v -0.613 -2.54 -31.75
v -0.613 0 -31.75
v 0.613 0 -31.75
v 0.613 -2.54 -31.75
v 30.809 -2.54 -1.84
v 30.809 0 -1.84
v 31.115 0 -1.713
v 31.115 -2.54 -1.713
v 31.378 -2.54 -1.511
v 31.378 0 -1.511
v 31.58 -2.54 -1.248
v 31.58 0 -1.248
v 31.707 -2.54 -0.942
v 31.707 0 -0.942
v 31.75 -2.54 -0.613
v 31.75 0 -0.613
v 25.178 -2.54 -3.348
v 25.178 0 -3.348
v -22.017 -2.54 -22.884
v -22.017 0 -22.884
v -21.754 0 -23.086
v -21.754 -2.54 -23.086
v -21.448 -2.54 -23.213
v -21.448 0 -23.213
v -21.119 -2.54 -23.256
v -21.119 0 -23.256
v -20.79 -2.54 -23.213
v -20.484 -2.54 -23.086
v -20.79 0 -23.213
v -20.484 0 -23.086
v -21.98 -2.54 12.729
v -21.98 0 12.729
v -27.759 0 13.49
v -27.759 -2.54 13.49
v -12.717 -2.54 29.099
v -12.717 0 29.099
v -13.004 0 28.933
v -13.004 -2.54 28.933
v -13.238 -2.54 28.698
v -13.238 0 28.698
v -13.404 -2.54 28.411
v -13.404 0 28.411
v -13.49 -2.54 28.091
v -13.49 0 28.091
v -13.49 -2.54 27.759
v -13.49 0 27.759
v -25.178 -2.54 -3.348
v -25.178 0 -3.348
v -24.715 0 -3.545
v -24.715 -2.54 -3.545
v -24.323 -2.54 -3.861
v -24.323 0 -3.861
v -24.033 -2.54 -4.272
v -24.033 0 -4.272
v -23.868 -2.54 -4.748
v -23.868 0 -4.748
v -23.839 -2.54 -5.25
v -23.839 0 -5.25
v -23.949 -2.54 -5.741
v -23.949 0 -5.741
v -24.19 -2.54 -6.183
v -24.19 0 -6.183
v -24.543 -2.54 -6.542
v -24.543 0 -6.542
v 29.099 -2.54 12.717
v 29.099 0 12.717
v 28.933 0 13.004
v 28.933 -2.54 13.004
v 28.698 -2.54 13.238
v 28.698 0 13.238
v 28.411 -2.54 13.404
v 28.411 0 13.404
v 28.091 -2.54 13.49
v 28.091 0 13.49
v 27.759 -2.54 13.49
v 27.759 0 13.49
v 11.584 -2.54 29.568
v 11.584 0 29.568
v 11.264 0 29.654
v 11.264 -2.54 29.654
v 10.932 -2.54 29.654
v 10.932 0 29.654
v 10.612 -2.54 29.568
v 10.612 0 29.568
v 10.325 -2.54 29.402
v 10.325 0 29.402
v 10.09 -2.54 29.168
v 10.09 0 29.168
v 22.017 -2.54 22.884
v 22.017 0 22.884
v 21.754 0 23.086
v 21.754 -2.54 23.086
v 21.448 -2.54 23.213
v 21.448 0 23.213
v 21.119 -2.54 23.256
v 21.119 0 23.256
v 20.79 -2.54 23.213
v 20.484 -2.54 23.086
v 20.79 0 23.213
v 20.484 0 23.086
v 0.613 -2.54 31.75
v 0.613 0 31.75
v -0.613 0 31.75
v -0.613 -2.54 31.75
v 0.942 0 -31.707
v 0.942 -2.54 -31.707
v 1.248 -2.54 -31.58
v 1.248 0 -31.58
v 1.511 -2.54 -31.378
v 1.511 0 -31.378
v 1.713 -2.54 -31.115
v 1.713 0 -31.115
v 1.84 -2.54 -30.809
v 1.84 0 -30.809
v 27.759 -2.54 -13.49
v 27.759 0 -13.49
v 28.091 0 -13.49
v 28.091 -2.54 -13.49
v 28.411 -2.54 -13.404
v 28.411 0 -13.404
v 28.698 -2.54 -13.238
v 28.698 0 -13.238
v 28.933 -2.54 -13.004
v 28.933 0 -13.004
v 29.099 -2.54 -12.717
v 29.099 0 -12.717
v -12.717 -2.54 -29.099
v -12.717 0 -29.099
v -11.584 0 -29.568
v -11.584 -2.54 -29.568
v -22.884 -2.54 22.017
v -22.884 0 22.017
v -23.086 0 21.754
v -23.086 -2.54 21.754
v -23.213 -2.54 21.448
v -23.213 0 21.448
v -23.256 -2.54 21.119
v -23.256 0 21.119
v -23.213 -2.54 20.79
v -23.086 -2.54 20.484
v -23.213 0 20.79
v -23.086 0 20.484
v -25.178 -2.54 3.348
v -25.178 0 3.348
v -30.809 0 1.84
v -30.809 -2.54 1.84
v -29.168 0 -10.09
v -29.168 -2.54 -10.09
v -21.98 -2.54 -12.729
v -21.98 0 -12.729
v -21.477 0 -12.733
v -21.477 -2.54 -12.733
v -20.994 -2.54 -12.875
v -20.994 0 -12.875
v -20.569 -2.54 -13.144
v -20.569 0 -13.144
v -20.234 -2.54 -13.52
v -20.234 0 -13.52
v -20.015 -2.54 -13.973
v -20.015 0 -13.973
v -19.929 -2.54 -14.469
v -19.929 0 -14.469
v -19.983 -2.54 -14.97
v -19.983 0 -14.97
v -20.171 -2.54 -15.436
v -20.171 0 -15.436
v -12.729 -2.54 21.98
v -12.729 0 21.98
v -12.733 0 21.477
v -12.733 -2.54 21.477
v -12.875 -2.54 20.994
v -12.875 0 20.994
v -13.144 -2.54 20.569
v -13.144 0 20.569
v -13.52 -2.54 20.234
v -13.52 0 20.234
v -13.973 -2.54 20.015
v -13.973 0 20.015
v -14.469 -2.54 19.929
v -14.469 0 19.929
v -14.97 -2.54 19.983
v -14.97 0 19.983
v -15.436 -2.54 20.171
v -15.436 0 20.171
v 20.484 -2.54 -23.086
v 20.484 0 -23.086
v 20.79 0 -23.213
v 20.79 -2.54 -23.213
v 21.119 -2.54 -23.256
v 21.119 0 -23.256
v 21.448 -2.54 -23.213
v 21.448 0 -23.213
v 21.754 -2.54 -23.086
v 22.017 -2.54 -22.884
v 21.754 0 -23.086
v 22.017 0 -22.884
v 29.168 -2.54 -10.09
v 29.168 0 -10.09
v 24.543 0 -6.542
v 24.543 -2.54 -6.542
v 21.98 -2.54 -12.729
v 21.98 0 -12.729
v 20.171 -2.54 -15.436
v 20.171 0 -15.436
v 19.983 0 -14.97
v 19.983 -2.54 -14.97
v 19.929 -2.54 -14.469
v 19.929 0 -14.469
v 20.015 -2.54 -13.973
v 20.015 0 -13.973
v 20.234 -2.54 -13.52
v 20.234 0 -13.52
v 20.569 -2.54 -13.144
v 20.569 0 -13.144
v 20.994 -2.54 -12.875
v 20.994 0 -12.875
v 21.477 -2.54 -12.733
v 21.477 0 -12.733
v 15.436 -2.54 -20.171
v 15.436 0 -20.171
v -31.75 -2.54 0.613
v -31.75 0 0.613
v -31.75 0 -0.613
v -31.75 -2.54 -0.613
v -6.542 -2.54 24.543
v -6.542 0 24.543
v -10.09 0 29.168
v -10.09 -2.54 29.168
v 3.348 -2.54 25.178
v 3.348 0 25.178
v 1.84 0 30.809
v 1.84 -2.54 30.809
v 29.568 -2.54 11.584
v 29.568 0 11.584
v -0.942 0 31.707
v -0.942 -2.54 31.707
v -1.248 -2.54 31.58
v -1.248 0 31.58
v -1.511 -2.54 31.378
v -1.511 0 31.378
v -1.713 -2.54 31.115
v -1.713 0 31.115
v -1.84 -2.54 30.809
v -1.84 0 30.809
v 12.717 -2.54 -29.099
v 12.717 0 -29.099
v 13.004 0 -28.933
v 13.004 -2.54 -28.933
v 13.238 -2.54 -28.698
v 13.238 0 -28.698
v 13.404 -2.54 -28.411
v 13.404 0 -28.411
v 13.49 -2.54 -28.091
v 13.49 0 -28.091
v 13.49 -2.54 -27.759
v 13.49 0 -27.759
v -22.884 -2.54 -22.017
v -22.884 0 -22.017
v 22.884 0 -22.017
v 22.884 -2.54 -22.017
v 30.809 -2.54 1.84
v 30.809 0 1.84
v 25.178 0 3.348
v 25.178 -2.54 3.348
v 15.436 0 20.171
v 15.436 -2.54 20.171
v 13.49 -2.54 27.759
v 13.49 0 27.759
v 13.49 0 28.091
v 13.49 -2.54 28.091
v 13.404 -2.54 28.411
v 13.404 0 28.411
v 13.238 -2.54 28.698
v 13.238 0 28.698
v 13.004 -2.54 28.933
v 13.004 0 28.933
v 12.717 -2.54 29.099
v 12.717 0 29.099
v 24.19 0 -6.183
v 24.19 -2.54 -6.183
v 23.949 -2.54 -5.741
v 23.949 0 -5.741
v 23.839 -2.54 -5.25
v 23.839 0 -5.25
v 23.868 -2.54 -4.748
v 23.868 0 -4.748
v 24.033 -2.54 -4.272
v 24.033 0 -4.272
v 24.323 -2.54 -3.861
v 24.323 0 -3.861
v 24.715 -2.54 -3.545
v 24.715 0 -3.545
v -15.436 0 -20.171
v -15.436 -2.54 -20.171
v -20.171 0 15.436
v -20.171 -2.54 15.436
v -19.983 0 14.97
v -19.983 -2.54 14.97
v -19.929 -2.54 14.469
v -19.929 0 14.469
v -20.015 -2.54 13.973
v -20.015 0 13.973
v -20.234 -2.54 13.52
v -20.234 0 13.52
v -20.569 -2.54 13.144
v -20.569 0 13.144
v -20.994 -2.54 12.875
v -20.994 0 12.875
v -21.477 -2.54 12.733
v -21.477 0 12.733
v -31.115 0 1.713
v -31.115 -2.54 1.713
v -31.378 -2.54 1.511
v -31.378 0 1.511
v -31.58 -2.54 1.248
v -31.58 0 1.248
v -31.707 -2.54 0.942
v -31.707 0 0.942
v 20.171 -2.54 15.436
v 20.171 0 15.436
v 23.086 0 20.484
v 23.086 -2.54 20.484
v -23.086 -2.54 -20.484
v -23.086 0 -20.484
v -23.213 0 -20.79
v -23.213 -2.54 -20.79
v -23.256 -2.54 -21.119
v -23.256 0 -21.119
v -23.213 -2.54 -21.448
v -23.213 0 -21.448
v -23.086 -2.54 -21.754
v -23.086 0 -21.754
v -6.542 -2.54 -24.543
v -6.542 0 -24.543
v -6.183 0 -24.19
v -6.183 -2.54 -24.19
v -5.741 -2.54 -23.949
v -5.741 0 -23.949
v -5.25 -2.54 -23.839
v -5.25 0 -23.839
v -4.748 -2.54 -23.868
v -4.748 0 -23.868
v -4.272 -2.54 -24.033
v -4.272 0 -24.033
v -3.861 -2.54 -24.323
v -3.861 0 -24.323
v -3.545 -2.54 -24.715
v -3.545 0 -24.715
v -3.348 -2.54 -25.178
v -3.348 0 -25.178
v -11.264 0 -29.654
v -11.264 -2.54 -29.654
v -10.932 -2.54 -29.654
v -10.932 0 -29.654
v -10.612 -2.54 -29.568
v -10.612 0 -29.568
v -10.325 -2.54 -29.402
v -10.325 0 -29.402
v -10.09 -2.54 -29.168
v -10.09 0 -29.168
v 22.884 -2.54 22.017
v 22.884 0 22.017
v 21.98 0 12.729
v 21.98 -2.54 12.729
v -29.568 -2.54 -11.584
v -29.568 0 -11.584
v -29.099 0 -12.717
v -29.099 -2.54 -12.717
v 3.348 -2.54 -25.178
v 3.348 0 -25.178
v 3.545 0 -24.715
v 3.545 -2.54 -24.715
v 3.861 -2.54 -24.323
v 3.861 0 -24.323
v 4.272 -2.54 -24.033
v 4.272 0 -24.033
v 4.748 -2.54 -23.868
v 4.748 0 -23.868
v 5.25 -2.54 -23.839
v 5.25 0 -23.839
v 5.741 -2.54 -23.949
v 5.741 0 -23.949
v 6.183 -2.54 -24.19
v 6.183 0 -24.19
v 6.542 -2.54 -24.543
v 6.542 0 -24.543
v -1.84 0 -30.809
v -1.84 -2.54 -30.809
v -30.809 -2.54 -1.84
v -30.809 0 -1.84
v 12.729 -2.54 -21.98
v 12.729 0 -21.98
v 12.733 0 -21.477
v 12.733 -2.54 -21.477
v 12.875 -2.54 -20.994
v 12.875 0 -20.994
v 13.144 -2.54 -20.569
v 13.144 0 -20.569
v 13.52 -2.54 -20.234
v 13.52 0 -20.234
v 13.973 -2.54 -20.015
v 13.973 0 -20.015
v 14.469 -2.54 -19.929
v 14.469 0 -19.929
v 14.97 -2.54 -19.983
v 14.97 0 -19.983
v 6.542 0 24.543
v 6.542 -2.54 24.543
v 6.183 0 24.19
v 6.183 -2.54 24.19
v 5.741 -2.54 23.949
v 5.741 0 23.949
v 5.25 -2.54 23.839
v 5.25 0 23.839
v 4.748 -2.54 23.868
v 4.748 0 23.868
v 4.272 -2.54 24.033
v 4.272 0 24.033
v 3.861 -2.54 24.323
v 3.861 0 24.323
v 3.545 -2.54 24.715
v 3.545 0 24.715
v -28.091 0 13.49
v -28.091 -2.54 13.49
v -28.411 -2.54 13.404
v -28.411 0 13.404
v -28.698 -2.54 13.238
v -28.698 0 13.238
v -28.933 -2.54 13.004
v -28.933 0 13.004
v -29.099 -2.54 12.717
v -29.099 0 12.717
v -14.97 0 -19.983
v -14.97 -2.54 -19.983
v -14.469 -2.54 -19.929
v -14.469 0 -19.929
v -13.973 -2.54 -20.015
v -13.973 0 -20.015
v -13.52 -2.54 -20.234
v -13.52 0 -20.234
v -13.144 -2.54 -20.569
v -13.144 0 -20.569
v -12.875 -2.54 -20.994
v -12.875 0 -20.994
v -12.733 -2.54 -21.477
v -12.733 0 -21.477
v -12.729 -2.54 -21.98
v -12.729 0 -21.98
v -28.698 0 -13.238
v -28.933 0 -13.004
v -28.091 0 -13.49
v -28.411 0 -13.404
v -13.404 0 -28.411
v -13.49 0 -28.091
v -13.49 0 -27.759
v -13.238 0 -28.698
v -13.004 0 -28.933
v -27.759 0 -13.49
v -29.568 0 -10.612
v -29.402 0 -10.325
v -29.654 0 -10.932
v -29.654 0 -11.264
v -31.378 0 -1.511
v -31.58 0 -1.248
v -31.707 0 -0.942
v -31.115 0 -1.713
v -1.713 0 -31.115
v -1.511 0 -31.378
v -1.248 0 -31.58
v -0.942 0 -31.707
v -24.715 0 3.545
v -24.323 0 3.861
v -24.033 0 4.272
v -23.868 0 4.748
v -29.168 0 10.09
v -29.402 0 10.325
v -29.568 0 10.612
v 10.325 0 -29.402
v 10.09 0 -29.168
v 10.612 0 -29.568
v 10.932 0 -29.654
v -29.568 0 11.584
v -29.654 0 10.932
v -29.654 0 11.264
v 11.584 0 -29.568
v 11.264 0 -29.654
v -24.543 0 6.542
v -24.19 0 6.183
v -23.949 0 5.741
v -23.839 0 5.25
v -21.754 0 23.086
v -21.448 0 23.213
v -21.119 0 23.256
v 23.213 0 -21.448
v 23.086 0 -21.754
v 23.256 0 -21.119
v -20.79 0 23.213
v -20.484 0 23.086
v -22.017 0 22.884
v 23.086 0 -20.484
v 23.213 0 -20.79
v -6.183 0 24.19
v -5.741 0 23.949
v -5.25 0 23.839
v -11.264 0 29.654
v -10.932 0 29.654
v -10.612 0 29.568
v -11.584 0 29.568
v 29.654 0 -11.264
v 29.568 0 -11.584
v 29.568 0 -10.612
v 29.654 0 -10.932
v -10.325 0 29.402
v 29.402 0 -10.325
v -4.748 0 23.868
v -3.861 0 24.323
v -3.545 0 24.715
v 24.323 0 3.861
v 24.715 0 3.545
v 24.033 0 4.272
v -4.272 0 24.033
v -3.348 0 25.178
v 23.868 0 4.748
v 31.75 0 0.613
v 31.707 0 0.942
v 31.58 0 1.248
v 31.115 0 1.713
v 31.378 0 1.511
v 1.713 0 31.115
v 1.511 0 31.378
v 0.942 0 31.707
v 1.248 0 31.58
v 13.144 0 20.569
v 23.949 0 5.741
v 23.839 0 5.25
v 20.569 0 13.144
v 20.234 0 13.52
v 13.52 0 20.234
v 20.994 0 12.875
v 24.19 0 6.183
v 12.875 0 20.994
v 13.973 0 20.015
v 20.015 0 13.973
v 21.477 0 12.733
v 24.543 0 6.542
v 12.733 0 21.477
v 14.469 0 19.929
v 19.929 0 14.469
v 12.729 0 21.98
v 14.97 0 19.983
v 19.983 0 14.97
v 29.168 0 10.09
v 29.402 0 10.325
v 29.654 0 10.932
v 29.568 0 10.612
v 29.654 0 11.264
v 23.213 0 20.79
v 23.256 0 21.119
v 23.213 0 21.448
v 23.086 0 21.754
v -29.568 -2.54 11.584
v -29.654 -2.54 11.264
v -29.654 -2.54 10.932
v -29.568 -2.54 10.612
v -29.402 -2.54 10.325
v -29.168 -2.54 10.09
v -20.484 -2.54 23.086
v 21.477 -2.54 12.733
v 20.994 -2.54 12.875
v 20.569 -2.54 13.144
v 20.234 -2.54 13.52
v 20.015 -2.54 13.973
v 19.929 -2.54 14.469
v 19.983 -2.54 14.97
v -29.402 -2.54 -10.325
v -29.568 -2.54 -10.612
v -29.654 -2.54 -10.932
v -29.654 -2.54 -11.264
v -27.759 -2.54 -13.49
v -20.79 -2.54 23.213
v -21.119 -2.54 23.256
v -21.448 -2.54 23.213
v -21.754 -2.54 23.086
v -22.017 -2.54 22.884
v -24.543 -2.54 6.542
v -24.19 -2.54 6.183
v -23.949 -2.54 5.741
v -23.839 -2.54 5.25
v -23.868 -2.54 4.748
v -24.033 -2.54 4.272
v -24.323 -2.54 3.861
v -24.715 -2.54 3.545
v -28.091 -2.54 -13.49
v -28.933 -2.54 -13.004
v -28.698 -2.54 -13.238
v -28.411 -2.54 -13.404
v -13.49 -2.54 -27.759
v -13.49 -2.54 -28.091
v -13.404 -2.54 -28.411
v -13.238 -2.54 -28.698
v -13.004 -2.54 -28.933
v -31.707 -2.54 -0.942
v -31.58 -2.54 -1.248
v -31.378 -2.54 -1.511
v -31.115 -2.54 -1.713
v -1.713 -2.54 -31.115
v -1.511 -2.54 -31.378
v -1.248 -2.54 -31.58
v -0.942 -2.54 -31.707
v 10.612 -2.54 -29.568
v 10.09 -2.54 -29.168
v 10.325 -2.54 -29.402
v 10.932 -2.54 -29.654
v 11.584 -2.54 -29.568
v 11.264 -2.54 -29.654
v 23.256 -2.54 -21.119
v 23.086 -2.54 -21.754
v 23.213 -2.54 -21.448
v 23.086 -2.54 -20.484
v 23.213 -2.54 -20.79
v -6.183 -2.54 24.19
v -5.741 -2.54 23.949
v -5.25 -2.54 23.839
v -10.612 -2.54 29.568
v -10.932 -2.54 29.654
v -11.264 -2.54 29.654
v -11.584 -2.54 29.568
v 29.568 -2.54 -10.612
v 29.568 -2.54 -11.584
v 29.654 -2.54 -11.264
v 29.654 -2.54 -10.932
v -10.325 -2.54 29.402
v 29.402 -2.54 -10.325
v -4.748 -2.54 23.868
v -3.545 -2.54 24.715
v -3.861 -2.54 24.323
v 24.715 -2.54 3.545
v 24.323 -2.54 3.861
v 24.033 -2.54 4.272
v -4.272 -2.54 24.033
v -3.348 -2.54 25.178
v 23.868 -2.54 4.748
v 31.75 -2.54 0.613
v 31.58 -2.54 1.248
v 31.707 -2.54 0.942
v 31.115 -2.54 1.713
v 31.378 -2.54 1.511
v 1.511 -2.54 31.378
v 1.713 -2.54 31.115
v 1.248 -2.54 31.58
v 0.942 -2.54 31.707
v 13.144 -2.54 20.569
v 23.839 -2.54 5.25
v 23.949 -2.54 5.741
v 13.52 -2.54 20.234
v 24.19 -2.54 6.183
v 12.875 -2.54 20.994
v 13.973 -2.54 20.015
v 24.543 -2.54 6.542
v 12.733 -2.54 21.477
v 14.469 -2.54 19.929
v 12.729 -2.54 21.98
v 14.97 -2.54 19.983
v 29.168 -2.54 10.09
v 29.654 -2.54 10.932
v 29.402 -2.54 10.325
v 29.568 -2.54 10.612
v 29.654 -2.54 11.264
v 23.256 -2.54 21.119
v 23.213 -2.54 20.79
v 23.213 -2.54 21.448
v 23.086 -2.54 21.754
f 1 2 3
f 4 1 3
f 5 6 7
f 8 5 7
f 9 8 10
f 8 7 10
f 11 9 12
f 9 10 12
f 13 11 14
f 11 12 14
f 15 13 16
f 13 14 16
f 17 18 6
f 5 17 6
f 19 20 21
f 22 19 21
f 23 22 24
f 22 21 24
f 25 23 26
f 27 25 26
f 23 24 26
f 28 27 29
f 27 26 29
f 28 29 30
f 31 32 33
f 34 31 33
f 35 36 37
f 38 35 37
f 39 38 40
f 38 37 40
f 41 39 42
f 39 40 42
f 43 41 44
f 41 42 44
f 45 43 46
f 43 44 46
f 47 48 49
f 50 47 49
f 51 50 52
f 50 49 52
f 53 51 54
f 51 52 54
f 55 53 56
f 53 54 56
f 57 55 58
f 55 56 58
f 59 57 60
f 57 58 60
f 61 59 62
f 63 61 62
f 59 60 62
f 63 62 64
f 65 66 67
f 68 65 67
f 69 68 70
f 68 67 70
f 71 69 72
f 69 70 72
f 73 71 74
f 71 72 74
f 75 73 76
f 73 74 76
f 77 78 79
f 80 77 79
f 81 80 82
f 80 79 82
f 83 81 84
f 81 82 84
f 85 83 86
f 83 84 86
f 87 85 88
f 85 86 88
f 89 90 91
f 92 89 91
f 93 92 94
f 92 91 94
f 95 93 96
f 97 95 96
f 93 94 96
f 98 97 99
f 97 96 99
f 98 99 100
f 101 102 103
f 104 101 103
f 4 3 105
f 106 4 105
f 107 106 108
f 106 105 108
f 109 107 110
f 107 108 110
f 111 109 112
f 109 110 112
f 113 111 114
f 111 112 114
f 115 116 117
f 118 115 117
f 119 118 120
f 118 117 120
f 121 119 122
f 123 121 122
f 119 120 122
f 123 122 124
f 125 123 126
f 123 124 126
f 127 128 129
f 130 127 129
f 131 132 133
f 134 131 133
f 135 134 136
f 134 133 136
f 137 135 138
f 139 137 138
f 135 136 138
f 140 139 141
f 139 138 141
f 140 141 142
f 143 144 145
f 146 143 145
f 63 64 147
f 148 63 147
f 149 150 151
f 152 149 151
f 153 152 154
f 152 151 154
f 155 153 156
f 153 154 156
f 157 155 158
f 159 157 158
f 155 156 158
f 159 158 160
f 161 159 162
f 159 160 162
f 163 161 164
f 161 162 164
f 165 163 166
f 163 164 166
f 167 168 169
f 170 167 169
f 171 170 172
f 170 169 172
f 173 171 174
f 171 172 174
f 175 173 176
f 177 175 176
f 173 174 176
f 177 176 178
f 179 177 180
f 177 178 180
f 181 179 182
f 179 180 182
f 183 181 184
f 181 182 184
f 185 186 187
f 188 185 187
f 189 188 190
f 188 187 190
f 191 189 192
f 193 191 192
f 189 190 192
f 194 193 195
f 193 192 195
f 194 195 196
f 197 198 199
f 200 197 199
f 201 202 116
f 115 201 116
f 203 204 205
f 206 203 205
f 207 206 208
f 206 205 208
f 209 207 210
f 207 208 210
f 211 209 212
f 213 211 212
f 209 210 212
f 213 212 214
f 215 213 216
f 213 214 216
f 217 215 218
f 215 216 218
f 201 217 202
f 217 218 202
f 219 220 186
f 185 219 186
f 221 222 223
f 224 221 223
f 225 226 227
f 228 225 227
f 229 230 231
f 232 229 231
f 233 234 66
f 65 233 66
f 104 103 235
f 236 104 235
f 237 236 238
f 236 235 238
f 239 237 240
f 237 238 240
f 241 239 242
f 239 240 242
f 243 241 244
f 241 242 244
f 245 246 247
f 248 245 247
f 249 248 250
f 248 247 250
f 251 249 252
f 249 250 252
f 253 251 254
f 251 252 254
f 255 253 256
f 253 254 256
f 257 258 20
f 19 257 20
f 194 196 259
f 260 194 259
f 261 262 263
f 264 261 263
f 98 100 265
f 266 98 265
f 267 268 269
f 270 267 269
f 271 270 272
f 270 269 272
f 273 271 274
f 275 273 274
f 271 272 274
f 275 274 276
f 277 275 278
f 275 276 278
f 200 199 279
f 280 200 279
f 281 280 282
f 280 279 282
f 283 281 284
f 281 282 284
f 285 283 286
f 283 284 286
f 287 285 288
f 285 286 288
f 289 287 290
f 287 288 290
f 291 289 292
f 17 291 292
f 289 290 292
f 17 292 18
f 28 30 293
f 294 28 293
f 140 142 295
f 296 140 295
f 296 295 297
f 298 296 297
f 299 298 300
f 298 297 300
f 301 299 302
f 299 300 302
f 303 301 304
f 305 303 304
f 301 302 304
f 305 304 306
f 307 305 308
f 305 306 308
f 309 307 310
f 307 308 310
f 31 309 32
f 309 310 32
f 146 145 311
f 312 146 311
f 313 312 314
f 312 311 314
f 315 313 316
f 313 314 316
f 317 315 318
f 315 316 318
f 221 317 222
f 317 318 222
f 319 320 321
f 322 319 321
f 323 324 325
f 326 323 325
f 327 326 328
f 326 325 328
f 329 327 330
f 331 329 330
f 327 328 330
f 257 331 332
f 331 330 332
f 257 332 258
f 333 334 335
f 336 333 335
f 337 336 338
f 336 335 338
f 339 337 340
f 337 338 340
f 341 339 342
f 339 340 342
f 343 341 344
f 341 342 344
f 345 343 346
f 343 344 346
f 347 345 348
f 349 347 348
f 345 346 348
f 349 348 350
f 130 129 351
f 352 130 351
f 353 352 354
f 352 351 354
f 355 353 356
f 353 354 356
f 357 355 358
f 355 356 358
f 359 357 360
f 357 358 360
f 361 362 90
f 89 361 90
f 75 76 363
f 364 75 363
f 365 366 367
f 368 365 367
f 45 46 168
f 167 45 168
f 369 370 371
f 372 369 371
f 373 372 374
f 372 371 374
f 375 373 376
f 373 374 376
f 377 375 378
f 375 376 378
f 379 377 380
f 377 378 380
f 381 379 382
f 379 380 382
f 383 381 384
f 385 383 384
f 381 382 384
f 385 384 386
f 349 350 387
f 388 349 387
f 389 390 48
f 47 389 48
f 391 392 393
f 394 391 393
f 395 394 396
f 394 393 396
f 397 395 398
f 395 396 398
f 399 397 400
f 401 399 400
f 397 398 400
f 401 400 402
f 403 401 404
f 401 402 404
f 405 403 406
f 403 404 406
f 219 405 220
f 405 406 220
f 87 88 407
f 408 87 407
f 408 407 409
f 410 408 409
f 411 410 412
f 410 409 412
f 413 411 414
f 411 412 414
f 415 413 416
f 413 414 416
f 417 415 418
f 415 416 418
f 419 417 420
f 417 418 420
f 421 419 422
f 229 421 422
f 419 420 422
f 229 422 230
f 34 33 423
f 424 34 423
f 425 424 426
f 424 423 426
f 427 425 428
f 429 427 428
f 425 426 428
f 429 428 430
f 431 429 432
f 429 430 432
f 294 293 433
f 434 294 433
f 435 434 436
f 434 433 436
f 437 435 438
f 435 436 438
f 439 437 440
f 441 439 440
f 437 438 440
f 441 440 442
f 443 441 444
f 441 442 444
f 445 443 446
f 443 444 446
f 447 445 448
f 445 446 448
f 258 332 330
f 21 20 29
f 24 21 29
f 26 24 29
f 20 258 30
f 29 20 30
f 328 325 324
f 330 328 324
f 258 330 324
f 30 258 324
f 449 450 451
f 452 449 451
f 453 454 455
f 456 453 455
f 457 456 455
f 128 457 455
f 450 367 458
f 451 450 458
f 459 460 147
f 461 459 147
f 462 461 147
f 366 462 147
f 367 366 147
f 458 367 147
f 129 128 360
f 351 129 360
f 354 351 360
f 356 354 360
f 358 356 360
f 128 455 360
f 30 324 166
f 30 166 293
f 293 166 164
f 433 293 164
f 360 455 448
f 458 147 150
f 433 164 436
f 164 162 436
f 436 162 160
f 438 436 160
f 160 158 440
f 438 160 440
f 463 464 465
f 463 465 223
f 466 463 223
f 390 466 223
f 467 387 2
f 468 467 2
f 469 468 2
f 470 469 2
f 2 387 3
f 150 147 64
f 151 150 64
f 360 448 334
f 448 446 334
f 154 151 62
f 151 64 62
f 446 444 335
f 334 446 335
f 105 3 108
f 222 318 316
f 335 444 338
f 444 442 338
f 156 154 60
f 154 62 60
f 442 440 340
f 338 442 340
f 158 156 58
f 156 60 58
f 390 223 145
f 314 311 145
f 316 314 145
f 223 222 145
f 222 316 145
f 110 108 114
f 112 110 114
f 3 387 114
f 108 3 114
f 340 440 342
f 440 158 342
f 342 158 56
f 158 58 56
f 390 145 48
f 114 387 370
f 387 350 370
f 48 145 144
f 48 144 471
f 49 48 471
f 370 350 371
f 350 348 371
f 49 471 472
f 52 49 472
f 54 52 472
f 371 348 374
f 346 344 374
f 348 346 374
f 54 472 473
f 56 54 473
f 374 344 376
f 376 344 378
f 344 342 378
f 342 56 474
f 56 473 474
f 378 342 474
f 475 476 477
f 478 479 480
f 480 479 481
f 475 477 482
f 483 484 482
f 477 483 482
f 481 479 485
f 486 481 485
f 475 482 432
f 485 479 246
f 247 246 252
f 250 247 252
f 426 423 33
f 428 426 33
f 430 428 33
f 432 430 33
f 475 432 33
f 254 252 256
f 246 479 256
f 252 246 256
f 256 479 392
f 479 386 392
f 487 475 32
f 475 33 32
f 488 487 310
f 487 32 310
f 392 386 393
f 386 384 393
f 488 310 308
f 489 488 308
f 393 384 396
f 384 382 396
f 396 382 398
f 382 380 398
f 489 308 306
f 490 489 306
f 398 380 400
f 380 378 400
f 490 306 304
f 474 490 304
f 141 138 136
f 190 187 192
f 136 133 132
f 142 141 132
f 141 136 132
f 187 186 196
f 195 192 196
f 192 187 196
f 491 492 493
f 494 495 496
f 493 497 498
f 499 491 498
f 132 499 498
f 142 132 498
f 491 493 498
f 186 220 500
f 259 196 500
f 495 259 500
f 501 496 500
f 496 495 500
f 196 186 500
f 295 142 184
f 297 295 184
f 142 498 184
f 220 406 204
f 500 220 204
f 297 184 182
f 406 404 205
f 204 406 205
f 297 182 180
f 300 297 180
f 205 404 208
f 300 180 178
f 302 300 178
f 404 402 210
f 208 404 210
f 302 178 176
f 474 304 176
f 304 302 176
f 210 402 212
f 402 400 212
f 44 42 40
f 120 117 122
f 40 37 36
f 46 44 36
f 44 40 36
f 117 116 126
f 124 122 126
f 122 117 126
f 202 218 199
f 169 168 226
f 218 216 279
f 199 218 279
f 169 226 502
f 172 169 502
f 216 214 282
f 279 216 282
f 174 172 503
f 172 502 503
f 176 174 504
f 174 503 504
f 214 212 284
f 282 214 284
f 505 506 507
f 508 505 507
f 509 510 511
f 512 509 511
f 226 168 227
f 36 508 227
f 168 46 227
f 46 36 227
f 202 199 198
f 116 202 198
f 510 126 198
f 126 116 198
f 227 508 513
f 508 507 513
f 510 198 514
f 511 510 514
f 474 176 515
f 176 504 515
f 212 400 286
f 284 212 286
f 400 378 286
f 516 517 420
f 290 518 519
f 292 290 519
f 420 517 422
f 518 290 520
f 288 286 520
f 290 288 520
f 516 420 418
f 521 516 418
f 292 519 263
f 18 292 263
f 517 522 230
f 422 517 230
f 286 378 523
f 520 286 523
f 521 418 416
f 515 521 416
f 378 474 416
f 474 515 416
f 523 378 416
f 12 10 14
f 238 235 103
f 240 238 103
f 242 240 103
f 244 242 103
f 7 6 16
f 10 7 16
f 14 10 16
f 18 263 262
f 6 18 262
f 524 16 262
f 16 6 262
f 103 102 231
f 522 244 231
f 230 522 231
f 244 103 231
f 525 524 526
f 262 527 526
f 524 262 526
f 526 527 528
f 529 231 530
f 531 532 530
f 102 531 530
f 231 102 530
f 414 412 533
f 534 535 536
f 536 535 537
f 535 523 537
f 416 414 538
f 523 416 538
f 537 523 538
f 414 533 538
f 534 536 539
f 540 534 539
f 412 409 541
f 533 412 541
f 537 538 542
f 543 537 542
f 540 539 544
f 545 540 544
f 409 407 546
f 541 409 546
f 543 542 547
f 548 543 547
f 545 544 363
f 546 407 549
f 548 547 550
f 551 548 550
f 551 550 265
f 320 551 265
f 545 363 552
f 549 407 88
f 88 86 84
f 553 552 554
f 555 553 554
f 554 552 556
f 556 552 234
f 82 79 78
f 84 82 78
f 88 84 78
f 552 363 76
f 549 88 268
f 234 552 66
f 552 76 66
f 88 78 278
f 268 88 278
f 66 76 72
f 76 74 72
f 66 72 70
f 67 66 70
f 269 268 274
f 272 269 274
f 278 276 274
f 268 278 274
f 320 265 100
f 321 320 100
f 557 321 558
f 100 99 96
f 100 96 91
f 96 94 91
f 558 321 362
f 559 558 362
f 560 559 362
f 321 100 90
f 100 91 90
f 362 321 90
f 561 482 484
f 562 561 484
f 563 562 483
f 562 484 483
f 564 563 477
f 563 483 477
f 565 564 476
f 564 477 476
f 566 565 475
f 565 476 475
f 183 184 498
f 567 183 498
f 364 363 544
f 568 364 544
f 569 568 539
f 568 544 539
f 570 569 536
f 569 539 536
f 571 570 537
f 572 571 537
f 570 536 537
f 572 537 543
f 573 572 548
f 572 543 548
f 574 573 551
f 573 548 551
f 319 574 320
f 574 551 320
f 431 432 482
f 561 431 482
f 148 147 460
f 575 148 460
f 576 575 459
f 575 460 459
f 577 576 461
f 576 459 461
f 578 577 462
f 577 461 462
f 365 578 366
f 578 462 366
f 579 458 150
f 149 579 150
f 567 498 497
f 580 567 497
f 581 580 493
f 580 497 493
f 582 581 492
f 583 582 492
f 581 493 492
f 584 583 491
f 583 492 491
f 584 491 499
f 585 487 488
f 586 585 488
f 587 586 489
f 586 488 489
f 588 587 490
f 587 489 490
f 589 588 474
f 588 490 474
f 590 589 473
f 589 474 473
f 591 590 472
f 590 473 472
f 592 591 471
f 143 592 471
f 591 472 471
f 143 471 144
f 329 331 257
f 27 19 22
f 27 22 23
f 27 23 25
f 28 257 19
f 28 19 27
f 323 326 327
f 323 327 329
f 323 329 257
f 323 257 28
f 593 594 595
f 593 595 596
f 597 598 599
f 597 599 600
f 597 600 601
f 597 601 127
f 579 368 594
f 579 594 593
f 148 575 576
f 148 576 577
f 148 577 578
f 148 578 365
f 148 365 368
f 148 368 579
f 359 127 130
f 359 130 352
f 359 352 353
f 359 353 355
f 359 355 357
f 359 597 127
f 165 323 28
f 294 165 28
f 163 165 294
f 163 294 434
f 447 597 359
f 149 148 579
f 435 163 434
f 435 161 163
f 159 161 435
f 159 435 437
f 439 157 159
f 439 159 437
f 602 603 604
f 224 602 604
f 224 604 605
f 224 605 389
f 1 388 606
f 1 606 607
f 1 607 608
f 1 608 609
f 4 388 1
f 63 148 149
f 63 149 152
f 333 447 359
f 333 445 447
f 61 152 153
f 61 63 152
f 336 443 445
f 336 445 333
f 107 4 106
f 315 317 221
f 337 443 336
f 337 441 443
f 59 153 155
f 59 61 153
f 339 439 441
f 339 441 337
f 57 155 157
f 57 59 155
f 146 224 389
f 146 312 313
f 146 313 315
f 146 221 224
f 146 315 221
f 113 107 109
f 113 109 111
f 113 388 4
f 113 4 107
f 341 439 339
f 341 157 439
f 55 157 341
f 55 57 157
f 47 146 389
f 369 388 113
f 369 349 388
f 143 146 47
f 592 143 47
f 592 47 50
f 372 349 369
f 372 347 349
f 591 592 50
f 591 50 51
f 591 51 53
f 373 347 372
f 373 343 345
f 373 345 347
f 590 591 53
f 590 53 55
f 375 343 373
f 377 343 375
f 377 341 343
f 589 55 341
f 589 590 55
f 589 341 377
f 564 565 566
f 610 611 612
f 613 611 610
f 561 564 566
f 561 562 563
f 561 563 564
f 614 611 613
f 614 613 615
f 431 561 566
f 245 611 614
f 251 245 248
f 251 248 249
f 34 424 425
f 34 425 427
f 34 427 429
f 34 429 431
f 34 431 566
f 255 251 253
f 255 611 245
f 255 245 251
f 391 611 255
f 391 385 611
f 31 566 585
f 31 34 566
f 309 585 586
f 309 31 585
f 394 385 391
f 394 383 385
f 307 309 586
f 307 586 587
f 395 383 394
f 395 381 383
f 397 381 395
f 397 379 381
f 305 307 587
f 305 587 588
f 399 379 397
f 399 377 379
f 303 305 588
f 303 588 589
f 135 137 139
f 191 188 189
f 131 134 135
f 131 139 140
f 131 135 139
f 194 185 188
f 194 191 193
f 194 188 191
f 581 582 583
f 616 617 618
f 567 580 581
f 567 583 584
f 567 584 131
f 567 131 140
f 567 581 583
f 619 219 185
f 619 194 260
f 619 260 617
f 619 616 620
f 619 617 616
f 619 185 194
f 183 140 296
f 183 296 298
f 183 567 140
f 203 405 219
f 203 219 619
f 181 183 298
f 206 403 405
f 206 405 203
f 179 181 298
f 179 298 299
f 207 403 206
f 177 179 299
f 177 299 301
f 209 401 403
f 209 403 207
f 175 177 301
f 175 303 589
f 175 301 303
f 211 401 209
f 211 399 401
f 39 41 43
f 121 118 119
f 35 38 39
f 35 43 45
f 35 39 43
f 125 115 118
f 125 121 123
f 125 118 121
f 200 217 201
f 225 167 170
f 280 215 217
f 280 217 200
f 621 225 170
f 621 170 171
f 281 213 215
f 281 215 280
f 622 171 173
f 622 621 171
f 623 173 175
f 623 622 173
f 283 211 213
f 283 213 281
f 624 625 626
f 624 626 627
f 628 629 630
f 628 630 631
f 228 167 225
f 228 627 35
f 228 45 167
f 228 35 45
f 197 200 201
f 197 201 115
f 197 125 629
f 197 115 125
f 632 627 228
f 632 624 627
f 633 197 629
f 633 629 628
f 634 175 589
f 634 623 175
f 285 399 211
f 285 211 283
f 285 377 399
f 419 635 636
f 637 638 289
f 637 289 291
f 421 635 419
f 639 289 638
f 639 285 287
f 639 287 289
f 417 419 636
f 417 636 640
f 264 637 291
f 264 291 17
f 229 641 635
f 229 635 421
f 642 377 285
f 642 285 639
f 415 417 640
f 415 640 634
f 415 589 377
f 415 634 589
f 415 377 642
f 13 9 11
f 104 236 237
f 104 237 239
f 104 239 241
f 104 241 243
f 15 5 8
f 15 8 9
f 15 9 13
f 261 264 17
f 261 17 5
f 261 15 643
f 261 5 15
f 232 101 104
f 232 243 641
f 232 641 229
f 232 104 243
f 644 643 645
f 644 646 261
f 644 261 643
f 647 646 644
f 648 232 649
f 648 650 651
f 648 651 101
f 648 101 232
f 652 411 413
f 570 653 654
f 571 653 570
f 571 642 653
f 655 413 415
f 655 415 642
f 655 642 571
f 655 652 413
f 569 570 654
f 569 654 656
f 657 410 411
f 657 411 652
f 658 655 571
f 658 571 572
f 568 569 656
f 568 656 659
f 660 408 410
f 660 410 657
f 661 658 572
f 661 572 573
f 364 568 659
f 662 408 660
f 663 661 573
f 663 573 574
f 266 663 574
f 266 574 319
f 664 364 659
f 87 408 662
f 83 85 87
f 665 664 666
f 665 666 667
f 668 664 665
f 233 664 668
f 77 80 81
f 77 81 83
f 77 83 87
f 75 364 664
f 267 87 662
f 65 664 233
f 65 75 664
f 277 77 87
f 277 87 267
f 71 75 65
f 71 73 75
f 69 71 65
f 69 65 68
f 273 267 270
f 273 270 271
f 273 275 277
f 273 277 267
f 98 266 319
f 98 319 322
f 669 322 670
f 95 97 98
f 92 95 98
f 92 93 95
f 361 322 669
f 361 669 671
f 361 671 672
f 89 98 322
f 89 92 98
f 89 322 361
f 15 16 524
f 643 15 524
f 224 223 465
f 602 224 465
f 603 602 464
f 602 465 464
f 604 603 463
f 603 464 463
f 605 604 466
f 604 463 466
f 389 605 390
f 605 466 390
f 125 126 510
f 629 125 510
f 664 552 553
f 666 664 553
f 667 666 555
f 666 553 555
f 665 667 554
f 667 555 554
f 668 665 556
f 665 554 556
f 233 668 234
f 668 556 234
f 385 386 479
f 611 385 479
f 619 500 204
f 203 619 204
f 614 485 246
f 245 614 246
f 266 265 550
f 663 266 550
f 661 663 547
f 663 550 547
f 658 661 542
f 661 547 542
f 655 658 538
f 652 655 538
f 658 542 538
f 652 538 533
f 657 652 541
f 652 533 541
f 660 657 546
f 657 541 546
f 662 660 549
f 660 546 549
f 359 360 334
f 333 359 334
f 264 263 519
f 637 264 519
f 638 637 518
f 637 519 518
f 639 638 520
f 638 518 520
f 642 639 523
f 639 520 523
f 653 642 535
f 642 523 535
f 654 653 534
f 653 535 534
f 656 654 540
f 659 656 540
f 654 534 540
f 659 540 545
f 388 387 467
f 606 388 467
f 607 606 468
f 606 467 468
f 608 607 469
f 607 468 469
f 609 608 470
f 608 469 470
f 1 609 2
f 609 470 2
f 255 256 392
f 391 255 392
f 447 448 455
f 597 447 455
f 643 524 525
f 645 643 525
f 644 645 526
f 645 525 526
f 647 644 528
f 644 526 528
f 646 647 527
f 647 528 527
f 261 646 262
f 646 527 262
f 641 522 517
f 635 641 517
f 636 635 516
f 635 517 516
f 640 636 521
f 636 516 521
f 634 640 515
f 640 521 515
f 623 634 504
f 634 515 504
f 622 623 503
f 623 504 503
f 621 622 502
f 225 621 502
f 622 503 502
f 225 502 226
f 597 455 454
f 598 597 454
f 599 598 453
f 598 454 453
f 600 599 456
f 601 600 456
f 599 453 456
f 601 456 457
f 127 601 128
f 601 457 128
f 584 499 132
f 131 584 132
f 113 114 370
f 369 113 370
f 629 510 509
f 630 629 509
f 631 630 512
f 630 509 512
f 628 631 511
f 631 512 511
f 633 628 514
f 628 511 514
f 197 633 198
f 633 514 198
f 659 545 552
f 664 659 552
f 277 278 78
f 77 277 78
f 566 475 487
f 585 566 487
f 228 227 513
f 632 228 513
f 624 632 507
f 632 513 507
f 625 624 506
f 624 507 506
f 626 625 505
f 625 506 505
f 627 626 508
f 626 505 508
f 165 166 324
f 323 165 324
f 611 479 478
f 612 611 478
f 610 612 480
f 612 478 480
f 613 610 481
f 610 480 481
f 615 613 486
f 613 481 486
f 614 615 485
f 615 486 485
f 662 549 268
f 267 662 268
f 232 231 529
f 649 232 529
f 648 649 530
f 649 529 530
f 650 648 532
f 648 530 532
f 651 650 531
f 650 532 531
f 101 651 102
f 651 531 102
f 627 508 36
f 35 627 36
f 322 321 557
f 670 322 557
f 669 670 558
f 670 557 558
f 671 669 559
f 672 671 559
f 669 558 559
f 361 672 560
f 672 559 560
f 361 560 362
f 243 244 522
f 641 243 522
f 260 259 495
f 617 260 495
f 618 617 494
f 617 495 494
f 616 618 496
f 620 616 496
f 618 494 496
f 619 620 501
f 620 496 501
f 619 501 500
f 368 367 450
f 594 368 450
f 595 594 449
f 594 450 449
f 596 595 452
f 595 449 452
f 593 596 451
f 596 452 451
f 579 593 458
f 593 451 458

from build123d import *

# Parameters (mm, degrees)
F1_DEPTH = 2.54


with BuildPart() as f1:
    # F0 (on Front) → F1 (new body)
    with BuildSketch(Plane.XZ):
        with BuildLine():
            Line((0.612995, 31.75), (-0.612995, 31.75))
            ThreePointArc((-0.612995, 31.75), (-1.386122, 31.487559), (-1.839721, 30.8087))
            Line((-1.839721, 30.8087), (-3.348373, 25.178332))
            ThreePointArc((-3.348373, 25.178332), (-4.747603, 23.86781), (-6.541837, 24.543112))
            Line((-6.541837, 24.543112), (-10.090299, 29.167558))
            ThreePointArc((-10.090299, 29.167558), (-10.769158, 29.621157), (-11.583866, 29.567758))
            Line((-11.583866, 29.567758), (-12.716532, 29.098592))
            ThreePointArc((-12.716532, 29.098592), (-13.330377, 28.560265), (-13.489659, 27.759497))
            Line((-13.489659, 27.759497), (-12.728824, 21.980379))
            ThreePointArc((-12.728824, 21.980379), (-13.520029, 20.234153), (-15.436112, 20.171427))
            Line((-15.436112, 20.171427), (-20.484162, 23.08592))
            ThreePointArc((-20.484162, 23.08592), (-21.28493, 23.245202), (-22.017188, 22.884093))
            Line((-22.017188, 22.884093), (-22.884093, 22.017188))
            ThreePointArc((-22.884093, 22.017188), (-23.245202, 21.28493), (-23.08592, 20.484162))
            Line((-23.08592, 20.484162), (-20.171427, 15.436112))
            ThreePointArc((-20.171427, 15.436112), (-20.234153, 13.520029), (-21.980379, 12.728824))
            Line((-21.980379, 12.728824), (-27.759497, 13.489659))
            ThreePointArc((-27.759497, 13.489659), (-28.560265, 13.330377), (-29.098592, 12.716532))
            Line((-29.098592, 12.716532), (-29.567758, 11.583866))
            ThreePointArc((-29.567758, 11.583866), (-29.621157, 10.769158), (-29.167558, 10.090299))
            Line((-29.167558, 10.090299), (-24.543112, 6.541837))
            ThreePointArc((-24.543112, 6.541837), (-23.86781, 4.747603), (-25.178332, 3.348373))
            Line((-25.178332, 3.348373), (-30.8087, 1.839721))
            ThreePointArc((-30.8087, 1.839721), (-31.487559, 1.386122), (-31.75, 0.612995))
            Line((-31.75, 0.612995), (-31.75, -0.612995))
            ThreePointArc((-31.75, -0.612995), (-31.487559, -1.386122), (-30.8087, -1.839721))
            Line((-30.8087, -1.839721), (-25.178332, -3.348373))
            ThreePointArc((-25.178332, -3.348373), (-23.86781, -4.747603), (-24.543112, -6.541837))
            Line((-24.543112, -6.541837), (-29.167558, -10.090299))
            ThreePointArc((-29.167558, -10.090299), (-29.621157, -10.769158), (-29.567758, -11.583866))
            Line((-29.567758, -11.583866), (-29.098592, -12.716532))
            ThreePointArc((-29.098592, -12.716532), (-28.560265, -13.330377), (-27.759497, -13.489659))
            Line((-27.759497, -13.489659), (-21.980379, -12.728824))
            ThreePointArc((-21.980379, -12.728824), (-20.234153, -13.520029), (-20.171427, -15.436112))
            Line((-20.171427, -15.436112), (-23.08592, -20.484162))
            ThreePointArc((-23.08592, -20.484162), (-23.245202, -21.28493), (-22.884093, -22.017188))
            Line((-22.884093, -22.017188), (-22.017188, -22.884093))
            ThreePointArc((-22.017188, -22.884093), (-21.28493, -23.245202), (-20.484162, -23.08592))
            Line((-20.484162, -23.08592), (-15.436112, -20.171427))
            ThreePointArc((-15.436112, -20.171427), (-13.520029, -20.234153), (-12.728824, -21.980379))
            Line((-12.728824, -21.980379), (-13.489659, -27.759497))
            ThreePointArc((-13.489659, -27.759497), (-13.330377, -28.560265), (-12.716532, -29.098592))
            Line((-12.716532, -29.098592), (-11.583866, -29.567758))
            ThreePointArc((-11.583866, -29.567758), (-10.769158, -29.621157), (-10.090299, -29.167558))
            Line((-10.090299, -29.167558), (-6.541837, -24.543112))
            ThreePointArc((-6.541837, -24.543112), (-4.747603, -23.86781), (-3.348373, -25.178332))
            Line((-3.348373, -25.178332), (-1.839721, -30.8087))
            ThreePointArc((-1.839721, -30.8087), (-1.386122, -31.487559), (-0.612995, -31.75))
            Line((-0.612995, -31.75), (0.612995, -31.75))
            ThreePointArc((0.612995, -31.75), (1.386122, -31.487559), (1.839721, -30.8087))
            Line((1.839721, -30.8087), (3.348373, -25.178332))
            ThreePointArc((3.348373, -25.178332), (4.747603, -23.86781), (6.541837, -24.543112))
            Line((6.541837, -24.543112), (10.090299, -29.167558))
            ThreePointArc((10.090299, -29.167558), (10.769158, -29.621157), (11.583866, -29.567758))
            Line((11.583866, -29.567758), (12.716532, -29.098592))
            ThreePointArc((12.716532, -29.098592), (13.330377, -28.560265), (13.489659, -27.759497))
            Line((13.489659, -27.759497), (12.728824, -21.980379))
            ThreePointArc((12.728824, -21.980379), (13.520029, -20.234153), (15.436112, -20.171427))
            Line((15.436112, -20.171427), (20.484162, -23.08592))
            ThreePointArc((20.484162, -23.08592), (21.28493, -23.245202), (22.017188, -22.884093))
            Line((22.017188, -22.884093), (22.884093, -22.017188))
            ThreePointArc((22.884093, -22.017188), (23.245202, -21.28493), (23.08592, -20.484162))
            Line((23.08592, -20.484162), (20.171427, -15.436112))
            ThreePointArc((20.171427, -15.436112), (20.234153, -13.520029), (21.980379, -12.728824))
            Line((21.980379, -12.728824), (27.759497, -13.489659))
            ThreePointArc((27.759497, -13.489659), (28.560265, -13.330377), (29.098592, -12.716532))
            Line((29.098592, -12.716532), (29.567758, -11.583866))
            ThreePointArc((29.567758, -11.583866), (29.621157, -10.769158), (29.167558, -10.090299))
            Line((29.167558, -10.090299), (24.543112, -6.541837))
            ThreePointArc((24.543112, -6.541837), (23.86781, -4.747603), (25.178332, -3.348373))
            Line((25.178332, -3.348373), (30.8087, -1.839721))
            ThreePointArc((30.8087, -1.839721), (31.487559, -1.386122), (31.75, -0.612995))
            Line((31.75, -0.612995), (31.75, 0.612995))
            ThreePointArc((31.75, 0.612995), (31.487559, 1.386122), (30.8087, 1.839721))
            Line((30.8087, 1.839721), (25.178332, 3.348373))
            ThreePointArc((25.178332, 3.348373), (23.86781, 4.747603), (24.543112, 6.541837))
            Line((24.543112, 6.541837), (29.167558, 10.090299))
            ThreePointArc((29.167558, 10.090299), (29.621157, 10.769158), (29.567758, 11.583866))
            Line((29.567758, 11.583866), (29.098592, 12.716532))
            ThreePointArc((29.098592, 12.716532), (28.560265, 13.330377), (27.759497, 13.489659))
            Line((27.759497, 13.489659), (21.980379, 12.728824))
            ThreePointArc((21.980379, 12.728824), (20.234153, 13.520029), (20.171427, 15.436112))
            Line((20.171427, 15.436112), (23.08592, 20.484162))
            ThreePointArc((23.08592, 20.484162), (23.245202, 21.28493), (22.884093, 22.017188))
            Line((22.884093, 22.017188), (22.017188, 22.884093))
            ThreePointArc((22.017188, 22.884093), (21.28493, 23.245202), (20.484162, 23.08592))
            Line((20.484162, 23.08592), (15.436112, 20.171427))
            ThreePointArc((15.436112, 20.171427), (13.520029, 20.234153), (12.728824, 21.980379))
            Line((12.728824, 21.980379), (13.489659, 27.759497))
            ThreePointArc((13.489659, 27.759497), (13.330377, 28.560265), (12.716532, 29.098592))
            Line((12.716532, 29.098592), (11.583866, 29.567758))
            ThreePointArc((11.583866, 29.567758), (10.769158, 29.621157), (10.090299, 29.167558))
            Line((10.090299, 29.167558), (6.541837, 24.543112))
            ThreePointArc((6.541837, 24.543112), (4.747603, 23.86781), (3.348373, 25.178332))
            Line((3.348373, 25.178332), (1.839721, 30.8087))
            ThreePointArc((1.839721, 30.8087), (1.386122, 31.487559), (0.612995, 31.75))
        make_face()
    extrude(amount=F1_DEPTH)


solid = f1.part
